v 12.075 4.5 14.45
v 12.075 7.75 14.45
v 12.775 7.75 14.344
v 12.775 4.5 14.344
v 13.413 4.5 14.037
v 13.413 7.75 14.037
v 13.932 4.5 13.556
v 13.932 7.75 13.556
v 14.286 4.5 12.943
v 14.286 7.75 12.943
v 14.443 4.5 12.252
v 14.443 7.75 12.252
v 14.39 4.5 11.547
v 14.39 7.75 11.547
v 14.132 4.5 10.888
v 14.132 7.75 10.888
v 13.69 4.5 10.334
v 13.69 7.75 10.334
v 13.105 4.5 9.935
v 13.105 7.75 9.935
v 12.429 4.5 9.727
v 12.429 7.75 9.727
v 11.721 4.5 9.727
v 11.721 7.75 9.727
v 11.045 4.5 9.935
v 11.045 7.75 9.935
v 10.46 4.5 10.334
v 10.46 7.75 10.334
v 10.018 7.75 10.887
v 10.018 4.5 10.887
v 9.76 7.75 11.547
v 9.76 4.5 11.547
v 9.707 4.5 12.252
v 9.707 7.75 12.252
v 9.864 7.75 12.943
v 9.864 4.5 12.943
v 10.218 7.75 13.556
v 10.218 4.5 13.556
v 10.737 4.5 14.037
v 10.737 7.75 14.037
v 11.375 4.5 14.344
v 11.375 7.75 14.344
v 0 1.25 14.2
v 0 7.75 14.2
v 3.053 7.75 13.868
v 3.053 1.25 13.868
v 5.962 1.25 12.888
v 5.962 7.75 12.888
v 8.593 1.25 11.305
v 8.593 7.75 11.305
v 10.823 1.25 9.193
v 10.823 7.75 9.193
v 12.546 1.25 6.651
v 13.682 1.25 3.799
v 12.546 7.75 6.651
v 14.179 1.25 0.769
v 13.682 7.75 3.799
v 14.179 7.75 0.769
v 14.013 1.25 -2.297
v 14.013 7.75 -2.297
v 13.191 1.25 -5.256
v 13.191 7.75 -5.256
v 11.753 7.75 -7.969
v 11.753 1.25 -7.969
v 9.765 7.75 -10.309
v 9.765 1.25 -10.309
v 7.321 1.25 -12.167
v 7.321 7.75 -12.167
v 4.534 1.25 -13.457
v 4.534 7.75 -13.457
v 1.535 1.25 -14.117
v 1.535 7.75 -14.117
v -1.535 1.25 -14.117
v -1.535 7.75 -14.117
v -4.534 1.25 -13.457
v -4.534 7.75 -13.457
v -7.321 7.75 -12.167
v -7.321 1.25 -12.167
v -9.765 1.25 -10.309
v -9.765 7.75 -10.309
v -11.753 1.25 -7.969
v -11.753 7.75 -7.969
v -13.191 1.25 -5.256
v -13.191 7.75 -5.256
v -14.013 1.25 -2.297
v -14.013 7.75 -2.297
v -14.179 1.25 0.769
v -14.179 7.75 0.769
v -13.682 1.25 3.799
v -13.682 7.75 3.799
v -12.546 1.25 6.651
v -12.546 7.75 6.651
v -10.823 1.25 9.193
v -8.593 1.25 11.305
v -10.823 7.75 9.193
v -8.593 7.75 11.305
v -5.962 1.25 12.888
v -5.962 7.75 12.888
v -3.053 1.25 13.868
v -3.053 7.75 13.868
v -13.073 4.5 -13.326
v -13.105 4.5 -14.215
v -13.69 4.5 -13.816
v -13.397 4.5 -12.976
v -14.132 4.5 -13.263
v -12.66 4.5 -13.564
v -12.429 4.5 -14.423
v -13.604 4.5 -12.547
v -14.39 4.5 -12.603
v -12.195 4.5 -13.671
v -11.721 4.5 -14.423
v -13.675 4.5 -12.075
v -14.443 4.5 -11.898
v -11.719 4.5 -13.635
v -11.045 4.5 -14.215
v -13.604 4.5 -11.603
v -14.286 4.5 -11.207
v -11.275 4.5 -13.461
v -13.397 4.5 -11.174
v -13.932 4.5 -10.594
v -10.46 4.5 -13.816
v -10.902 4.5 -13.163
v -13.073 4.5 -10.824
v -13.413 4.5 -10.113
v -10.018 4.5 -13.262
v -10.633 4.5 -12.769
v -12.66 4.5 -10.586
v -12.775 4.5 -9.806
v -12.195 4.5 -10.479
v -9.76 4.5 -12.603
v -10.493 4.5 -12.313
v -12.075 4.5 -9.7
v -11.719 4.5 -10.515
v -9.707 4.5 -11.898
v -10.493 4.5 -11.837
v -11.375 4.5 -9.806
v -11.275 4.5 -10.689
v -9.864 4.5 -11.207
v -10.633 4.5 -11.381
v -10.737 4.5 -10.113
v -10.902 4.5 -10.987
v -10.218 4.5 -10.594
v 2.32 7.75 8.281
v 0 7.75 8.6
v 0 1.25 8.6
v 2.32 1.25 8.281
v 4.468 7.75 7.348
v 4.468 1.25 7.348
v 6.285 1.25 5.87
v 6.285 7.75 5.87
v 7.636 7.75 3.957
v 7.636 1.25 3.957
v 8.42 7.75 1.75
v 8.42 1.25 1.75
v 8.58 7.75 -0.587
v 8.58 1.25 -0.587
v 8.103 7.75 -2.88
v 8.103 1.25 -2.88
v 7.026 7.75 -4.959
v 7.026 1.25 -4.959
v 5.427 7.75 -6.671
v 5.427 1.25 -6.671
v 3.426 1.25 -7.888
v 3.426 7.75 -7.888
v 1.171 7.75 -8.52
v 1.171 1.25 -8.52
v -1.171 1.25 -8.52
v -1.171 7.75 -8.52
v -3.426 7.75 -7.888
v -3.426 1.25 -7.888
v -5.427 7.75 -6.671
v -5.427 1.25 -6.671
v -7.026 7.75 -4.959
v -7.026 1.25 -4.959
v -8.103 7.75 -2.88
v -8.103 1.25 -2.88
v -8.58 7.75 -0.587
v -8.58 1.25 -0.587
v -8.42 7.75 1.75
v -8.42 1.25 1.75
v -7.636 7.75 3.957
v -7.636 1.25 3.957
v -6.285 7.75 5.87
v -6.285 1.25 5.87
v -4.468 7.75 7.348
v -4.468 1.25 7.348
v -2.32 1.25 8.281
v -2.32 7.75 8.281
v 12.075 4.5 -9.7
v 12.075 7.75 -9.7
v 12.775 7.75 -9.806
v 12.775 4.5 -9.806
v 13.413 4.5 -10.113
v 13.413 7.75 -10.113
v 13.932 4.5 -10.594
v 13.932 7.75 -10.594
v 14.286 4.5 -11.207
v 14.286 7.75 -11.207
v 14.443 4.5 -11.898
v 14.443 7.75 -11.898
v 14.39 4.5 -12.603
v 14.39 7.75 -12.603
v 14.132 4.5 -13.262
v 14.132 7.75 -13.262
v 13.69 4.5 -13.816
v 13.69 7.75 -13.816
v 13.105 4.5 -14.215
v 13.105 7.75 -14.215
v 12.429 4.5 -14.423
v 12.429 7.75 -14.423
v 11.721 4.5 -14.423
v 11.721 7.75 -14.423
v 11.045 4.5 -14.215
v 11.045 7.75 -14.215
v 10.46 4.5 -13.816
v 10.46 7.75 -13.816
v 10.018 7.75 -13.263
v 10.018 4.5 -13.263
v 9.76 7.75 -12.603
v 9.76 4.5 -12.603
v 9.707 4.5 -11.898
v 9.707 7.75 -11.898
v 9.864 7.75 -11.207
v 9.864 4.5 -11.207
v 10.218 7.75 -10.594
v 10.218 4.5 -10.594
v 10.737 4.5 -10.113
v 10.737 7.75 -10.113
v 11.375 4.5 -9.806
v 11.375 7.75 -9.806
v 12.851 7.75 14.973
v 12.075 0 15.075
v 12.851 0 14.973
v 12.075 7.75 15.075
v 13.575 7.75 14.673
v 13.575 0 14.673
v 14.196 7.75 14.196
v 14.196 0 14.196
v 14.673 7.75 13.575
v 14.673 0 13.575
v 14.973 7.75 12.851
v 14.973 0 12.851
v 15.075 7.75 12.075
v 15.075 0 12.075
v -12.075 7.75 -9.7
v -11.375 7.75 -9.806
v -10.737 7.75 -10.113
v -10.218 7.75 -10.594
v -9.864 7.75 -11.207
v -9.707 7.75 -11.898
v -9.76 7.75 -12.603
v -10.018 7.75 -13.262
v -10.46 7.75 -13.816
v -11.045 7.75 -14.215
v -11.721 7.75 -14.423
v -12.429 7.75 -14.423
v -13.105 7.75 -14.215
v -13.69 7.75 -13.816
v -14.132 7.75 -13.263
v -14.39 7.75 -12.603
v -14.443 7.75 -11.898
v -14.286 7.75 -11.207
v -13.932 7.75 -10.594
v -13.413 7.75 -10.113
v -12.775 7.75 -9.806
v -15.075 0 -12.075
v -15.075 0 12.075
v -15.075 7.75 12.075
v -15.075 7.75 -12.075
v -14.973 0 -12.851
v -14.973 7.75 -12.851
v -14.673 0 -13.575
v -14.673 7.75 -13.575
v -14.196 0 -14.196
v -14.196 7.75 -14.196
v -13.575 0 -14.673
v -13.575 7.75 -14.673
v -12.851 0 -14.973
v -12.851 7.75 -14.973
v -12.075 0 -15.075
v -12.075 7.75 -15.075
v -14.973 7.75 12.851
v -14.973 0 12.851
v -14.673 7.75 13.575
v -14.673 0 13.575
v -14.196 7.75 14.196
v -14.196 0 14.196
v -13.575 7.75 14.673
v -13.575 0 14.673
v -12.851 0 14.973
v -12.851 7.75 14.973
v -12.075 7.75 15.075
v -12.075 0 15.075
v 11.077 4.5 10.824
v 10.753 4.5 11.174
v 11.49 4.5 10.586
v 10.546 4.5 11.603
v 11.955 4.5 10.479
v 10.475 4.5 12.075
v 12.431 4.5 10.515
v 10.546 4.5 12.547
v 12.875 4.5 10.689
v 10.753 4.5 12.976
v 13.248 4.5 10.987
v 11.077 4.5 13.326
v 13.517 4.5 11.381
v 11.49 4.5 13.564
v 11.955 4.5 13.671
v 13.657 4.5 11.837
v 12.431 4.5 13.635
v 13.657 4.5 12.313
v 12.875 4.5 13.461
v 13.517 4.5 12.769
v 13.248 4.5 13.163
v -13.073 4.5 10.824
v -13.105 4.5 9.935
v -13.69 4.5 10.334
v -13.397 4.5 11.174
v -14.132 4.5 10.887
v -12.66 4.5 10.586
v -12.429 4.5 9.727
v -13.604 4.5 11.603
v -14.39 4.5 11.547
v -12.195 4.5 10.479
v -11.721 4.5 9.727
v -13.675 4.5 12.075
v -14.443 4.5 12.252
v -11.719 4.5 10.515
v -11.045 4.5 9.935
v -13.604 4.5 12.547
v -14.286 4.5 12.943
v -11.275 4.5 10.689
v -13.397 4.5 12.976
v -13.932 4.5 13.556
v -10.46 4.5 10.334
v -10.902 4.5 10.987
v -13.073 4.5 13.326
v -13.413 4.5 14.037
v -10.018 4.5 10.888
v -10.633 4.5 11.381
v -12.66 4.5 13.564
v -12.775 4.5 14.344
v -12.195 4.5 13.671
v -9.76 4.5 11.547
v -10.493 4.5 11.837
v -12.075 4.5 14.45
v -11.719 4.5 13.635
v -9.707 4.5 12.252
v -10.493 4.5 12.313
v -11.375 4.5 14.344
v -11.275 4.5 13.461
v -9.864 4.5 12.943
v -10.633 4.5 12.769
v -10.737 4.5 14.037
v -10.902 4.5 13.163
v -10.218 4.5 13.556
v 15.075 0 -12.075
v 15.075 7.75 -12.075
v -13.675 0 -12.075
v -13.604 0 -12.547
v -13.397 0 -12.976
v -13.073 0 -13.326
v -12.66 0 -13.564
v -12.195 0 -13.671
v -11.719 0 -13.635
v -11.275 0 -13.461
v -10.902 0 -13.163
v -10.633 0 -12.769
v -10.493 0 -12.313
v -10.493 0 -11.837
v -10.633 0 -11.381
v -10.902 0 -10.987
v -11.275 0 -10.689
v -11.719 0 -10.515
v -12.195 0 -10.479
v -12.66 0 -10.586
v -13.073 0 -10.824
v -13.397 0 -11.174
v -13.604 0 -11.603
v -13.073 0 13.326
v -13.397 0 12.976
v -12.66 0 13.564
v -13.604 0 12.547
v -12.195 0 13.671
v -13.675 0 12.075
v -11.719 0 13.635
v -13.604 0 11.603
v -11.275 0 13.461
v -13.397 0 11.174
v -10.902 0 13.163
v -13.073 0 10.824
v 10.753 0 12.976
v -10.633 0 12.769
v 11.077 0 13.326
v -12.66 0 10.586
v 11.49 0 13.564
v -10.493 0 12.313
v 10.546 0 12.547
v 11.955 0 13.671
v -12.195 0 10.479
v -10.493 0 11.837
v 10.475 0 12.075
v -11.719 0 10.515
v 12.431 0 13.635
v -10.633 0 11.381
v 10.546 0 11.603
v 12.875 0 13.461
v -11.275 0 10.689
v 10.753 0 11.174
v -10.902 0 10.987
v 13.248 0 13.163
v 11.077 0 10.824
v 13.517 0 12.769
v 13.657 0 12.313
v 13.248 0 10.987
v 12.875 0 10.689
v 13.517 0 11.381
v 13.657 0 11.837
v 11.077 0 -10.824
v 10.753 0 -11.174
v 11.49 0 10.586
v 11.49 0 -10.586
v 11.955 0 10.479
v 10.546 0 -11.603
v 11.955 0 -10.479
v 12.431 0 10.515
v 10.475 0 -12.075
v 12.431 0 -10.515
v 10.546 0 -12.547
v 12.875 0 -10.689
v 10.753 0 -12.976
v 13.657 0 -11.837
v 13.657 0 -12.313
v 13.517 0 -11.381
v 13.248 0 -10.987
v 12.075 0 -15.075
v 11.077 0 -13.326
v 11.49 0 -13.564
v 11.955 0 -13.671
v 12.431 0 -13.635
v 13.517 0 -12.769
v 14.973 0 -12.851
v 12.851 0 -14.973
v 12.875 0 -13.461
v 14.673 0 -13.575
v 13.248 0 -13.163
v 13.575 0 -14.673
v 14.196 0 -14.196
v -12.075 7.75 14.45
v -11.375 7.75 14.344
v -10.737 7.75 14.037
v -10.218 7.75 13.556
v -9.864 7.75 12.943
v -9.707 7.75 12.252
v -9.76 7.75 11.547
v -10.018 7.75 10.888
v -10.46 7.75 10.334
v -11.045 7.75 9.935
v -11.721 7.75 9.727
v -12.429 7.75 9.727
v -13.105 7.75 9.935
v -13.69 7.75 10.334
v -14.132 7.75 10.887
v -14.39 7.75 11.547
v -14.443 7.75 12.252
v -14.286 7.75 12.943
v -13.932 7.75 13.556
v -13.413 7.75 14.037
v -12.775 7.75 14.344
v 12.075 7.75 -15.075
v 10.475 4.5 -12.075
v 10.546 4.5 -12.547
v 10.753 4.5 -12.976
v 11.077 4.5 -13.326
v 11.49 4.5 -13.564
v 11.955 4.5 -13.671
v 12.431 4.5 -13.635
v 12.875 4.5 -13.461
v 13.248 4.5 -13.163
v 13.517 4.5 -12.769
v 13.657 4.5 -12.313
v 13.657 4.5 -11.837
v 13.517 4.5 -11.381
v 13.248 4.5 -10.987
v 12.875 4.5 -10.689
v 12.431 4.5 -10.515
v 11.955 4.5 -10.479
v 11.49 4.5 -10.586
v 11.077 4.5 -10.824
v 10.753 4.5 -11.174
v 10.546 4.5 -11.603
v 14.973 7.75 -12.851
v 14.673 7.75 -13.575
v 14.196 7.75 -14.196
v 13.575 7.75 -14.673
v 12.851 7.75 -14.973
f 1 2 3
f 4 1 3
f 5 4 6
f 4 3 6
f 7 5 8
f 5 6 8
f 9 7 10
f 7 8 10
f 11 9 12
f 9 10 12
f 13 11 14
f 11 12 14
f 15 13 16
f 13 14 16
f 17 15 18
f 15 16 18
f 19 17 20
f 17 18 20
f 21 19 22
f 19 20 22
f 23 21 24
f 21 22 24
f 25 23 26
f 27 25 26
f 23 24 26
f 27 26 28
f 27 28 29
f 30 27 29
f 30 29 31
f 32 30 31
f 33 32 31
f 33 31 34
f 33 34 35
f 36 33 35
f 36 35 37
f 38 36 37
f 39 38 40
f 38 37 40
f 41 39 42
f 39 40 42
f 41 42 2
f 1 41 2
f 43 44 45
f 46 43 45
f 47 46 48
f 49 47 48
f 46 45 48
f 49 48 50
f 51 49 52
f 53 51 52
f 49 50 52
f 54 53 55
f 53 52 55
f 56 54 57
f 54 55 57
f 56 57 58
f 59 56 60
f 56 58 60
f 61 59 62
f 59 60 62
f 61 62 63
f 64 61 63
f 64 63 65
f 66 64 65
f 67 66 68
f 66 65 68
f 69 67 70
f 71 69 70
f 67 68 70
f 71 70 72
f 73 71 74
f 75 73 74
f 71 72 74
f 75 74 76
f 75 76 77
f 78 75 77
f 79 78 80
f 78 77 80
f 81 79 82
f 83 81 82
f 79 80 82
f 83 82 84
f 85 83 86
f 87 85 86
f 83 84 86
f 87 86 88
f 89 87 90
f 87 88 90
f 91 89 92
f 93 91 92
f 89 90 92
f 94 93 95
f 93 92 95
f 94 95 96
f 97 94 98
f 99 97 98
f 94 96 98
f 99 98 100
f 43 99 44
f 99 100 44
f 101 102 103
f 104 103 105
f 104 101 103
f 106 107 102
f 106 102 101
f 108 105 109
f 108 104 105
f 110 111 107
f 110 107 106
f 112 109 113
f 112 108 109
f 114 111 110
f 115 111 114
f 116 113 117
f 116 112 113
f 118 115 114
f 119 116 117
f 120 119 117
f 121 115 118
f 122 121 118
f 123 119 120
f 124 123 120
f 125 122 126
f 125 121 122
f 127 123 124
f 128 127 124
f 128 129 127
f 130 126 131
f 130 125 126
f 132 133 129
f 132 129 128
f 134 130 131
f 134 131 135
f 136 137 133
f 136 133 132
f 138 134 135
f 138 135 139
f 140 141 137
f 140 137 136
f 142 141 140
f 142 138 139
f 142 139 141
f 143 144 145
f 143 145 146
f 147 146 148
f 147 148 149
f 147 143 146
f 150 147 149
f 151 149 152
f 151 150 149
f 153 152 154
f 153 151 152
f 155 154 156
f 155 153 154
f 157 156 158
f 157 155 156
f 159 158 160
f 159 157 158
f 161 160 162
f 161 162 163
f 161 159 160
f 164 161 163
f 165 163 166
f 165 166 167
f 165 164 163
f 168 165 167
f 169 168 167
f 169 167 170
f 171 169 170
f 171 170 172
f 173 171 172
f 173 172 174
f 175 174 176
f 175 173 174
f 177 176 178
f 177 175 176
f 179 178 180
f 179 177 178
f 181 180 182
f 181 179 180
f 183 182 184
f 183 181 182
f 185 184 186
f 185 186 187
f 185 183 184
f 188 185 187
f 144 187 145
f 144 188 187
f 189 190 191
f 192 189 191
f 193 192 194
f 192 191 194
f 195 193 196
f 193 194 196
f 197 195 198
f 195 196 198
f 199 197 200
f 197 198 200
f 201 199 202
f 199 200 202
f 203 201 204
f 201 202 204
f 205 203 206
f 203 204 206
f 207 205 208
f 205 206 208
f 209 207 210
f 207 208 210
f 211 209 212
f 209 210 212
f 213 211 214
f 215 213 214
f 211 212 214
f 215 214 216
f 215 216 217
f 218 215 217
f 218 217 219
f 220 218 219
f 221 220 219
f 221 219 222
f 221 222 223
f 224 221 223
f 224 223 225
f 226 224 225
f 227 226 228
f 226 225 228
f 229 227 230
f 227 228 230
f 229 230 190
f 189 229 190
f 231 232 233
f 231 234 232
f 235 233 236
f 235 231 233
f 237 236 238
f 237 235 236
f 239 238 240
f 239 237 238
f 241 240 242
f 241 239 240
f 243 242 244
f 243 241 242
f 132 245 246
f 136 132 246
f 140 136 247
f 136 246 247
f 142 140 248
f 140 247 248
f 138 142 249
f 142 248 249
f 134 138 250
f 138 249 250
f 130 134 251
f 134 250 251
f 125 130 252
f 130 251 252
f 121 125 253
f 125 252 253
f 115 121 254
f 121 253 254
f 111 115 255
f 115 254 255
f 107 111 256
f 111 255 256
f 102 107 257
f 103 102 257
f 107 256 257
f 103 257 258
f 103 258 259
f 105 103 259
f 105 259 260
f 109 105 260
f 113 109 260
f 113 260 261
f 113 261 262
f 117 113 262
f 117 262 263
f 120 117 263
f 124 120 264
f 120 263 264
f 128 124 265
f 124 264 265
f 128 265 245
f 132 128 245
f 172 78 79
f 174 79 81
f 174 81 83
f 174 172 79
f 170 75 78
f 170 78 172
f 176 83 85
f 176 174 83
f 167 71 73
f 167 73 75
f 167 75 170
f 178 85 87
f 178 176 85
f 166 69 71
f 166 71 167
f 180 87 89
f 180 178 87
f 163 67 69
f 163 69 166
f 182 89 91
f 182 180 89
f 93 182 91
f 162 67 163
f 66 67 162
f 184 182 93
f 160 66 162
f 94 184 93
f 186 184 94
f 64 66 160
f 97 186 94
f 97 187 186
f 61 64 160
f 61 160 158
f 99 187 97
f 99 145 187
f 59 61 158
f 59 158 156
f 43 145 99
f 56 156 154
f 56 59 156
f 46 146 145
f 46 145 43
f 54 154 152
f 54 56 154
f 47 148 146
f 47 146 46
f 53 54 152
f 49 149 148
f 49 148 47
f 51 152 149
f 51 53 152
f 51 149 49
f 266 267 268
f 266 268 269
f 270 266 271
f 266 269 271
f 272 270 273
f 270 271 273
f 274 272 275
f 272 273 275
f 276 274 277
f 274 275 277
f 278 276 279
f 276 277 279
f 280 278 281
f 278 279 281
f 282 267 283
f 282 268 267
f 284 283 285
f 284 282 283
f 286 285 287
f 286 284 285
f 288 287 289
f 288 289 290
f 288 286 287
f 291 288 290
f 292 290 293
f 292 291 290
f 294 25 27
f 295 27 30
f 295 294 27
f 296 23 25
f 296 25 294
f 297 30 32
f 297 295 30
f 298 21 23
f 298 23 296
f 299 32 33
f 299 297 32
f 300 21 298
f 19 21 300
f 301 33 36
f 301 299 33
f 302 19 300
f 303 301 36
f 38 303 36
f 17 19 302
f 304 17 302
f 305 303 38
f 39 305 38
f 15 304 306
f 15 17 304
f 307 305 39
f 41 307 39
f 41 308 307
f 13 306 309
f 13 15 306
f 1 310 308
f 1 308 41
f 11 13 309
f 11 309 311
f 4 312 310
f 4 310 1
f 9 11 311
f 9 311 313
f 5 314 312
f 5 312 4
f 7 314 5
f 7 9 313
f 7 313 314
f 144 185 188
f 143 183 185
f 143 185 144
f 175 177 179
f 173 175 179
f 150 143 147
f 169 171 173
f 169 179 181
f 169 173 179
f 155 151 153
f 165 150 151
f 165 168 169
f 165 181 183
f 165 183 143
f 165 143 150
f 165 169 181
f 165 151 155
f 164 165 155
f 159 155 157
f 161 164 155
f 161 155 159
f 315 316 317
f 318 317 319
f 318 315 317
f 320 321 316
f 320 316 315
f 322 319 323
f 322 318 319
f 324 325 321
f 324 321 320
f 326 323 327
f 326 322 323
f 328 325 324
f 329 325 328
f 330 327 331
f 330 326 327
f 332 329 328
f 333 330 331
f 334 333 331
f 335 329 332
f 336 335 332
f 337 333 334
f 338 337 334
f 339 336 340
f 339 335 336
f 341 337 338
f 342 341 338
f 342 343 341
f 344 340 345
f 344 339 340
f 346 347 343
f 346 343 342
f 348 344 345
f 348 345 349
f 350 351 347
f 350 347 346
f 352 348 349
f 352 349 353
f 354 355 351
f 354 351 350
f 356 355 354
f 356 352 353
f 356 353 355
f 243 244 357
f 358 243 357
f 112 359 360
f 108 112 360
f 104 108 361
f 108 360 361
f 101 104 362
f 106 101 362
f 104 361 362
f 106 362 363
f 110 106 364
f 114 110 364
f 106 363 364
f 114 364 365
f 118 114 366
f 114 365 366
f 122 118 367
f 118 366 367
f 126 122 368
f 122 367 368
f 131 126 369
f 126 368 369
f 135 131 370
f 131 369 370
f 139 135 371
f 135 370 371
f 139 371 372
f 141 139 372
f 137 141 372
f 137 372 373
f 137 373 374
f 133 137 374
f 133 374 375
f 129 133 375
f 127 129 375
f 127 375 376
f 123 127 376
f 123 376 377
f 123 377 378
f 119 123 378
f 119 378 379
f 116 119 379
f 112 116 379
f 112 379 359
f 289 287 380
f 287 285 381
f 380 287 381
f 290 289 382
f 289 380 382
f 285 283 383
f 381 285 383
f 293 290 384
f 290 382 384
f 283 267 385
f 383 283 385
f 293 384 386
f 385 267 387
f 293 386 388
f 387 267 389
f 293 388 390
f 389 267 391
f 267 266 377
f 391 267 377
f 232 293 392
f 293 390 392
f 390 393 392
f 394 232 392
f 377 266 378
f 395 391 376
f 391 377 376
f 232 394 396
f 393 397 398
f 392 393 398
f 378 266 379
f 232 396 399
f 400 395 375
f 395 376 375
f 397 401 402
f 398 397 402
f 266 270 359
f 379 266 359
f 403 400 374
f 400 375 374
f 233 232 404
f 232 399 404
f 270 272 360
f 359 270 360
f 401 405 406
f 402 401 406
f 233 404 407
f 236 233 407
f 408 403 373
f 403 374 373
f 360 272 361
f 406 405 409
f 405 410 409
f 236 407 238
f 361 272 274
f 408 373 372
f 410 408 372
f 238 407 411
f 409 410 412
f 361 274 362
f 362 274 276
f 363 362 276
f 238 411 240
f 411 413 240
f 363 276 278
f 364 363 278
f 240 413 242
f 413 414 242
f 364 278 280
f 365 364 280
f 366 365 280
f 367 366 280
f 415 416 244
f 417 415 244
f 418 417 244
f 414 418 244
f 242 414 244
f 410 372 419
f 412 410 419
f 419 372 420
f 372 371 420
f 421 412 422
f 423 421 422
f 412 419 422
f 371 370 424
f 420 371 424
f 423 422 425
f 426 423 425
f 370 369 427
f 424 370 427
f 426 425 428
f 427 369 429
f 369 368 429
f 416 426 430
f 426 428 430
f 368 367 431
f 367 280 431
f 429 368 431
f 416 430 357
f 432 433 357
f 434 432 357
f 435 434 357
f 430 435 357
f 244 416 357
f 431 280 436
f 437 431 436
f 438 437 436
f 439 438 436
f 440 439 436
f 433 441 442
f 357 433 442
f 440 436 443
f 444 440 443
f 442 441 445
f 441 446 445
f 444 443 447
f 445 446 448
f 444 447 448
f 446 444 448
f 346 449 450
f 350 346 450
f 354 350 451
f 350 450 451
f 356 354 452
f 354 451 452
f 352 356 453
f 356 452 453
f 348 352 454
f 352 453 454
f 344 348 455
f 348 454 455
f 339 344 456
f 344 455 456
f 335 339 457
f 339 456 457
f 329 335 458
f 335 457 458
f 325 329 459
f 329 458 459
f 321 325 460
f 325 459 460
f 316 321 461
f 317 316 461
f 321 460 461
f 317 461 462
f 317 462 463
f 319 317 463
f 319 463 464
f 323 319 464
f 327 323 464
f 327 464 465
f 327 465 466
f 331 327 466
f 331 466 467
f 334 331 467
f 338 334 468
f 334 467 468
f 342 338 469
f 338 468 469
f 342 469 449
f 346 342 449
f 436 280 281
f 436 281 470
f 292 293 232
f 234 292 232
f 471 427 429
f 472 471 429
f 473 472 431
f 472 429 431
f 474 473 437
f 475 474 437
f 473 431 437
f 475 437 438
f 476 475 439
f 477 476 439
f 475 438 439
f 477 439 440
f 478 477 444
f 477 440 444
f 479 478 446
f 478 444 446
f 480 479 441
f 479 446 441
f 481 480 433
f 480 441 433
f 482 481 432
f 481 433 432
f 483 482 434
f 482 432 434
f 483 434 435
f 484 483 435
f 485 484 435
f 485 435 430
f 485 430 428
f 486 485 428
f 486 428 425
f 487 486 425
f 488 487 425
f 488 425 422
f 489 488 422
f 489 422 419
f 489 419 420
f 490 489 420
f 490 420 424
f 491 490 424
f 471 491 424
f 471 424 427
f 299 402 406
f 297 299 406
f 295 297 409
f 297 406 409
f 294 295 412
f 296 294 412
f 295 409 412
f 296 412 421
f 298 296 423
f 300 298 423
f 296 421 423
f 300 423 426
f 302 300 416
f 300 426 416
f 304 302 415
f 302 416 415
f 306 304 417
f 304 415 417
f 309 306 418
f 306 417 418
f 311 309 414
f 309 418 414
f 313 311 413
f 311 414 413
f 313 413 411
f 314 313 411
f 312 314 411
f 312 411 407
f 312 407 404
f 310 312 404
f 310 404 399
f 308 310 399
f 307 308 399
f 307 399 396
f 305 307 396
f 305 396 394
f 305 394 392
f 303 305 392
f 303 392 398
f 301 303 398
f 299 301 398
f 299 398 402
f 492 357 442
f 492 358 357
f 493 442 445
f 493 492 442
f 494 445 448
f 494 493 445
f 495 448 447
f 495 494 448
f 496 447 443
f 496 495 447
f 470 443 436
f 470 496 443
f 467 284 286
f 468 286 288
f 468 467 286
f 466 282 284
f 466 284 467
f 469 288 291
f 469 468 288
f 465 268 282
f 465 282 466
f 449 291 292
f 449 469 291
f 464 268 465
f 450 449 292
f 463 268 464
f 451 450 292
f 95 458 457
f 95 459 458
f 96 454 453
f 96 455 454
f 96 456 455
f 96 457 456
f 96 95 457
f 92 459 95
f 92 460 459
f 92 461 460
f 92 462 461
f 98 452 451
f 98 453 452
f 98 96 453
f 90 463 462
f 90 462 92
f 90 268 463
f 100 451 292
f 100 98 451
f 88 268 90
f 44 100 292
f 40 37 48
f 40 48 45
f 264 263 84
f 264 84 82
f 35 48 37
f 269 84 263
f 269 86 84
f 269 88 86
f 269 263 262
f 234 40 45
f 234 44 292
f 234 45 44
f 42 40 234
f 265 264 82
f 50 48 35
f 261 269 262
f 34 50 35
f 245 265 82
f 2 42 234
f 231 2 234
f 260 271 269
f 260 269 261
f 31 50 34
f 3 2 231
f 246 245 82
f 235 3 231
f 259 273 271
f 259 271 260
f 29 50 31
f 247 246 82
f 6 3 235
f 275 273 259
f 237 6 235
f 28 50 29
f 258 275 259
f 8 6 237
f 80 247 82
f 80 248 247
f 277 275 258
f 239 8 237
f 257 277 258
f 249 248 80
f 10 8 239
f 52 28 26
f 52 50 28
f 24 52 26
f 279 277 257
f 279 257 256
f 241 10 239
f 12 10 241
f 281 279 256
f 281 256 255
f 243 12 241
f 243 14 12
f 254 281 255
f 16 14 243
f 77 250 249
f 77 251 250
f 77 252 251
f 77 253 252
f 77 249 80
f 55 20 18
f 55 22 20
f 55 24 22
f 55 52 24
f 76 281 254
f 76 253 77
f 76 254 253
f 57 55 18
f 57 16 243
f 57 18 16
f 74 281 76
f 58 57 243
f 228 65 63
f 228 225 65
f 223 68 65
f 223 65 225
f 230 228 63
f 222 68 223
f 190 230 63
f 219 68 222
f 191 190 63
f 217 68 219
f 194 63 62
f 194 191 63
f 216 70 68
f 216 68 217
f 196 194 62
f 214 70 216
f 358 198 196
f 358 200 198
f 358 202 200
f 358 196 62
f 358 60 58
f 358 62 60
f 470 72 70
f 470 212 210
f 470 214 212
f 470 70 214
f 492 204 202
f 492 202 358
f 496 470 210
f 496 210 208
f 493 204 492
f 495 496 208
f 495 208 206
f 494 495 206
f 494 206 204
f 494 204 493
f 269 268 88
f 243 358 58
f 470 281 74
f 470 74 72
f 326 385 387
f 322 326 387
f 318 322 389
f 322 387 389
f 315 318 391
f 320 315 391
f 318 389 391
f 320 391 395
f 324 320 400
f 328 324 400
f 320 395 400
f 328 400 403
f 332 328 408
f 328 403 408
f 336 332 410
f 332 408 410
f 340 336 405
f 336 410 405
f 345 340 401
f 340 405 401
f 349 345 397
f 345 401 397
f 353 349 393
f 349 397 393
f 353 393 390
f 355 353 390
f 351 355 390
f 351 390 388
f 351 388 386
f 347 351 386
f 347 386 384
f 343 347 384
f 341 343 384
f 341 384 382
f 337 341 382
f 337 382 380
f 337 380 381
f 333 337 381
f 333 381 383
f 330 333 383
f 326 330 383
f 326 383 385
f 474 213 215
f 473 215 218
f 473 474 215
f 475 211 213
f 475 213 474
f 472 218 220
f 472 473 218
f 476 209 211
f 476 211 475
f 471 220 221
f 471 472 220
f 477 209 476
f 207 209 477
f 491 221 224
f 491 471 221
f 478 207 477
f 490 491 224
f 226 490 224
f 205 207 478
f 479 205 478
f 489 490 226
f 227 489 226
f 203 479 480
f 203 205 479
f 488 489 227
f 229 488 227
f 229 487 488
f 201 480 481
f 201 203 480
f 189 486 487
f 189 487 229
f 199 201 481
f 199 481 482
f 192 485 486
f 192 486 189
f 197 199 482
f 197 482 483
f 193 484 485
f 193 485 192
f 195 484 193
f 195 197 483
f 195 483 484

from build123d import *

# Parameters (mm, degrees)
SKETCH1_W            = 30.15
SKETCH1_H            = 30.15
BOSS_EXTRUDE1_DEPTH  = 7.75
FILLET1_R            = 3
M3_CLEARANCE_HOLE1_D = 3.2
SKETCH4_R            = 2.375
CUT_EXTRUDE1_DEPTH   = 3.25
SKETCH5_R            = 14.2
SKETCH5_R_2          = 8.6
CUT_EXTRUDE2_DEPTH   = 6.5


with BuildPart() as part:
    # Sketch1 → Boss-Extrude1 (new body)
    with BuildSketch(Plane(origin=(0, 0, 0), x_dir=(1, 0, 0), z_dir=(0, 1, 0))):
        Rectangle(SKETCH1_W, SKETCH1_H)
    extrude(amount=BOSS_EXTRUDE1_DEPTH)

    # Fillet1
    fillet1_edges = [part.edges().sort_by_distance(p)[0] for p in [
        (15.075, 3.875, 15.075),
        (-15.075, 3.875, 15.075),
        (-15.075, 3.875, -15.075),
        (15.075, 3.875, -15.075),
    ]]
    fillet(fillet1_edges, radius=FILLET1_R)

    # M3 Clearance Hole1 (through all)
    with Locations(Plane(origin=(0, 7.75, 0), x_dir=(1, 0, 0), z_dir=(0, 1, 0))):
        with Locations((-12.075, 12.075), (12.075, 12.075), (12.075, -12.075), (-12.075, -12.075)):
            Hole(M3_CLEARANCE_HOLE1_D / 2)

    # Sketch4 → Cut-Extrude1 (cut)
    with BuildSketch(Plane(origin=(0, 7.75, 0), x_dir=(1, 0, 0), z_dir=(0, 1, 0))):
        with Locations(Location((-12.075, 12.075, 0), (0, 0, 270))):
            Circle(SKETCH4_R)
        with Locations(Location((12.075, 12.075, 0), (0, 0, 270))):
            Circle(SKETCH4_R)
        with Locations(Location((-12.075, -12.075, 0), (0, 0, 270))):
            Circle(SKETCH4_R)
        with Locations(Location((12.075, -12.075, 0), (0, 0, 270))):
            Circle(SKETCH4_R)
    extrude(amount=-CUT_EXTRUDE1_DEPTH, mode=Mode.SUBTRACT)

    # Sketch5 → Cut-Extrude2 (cut)
    with BuildSketch(Plane(origin=(0, 7.75, 0), x_dir=(1, 0, 0), z_dir=(0, 1, 0))):
        with Locations(Location((0, 0, 0), (0, 0, 270))):
            Circle(SKETCH5_R)
        with Locations(Location((0, 0, 0), (0, 0, 270))):
            Circle(SKETCH5_R_2, mode=Mode.SUBTRACT)
    extrude(amount=-CUT_EXTRUDE2_DEPTH, mode=Mode.SUBTRACT)


solid = part.part
